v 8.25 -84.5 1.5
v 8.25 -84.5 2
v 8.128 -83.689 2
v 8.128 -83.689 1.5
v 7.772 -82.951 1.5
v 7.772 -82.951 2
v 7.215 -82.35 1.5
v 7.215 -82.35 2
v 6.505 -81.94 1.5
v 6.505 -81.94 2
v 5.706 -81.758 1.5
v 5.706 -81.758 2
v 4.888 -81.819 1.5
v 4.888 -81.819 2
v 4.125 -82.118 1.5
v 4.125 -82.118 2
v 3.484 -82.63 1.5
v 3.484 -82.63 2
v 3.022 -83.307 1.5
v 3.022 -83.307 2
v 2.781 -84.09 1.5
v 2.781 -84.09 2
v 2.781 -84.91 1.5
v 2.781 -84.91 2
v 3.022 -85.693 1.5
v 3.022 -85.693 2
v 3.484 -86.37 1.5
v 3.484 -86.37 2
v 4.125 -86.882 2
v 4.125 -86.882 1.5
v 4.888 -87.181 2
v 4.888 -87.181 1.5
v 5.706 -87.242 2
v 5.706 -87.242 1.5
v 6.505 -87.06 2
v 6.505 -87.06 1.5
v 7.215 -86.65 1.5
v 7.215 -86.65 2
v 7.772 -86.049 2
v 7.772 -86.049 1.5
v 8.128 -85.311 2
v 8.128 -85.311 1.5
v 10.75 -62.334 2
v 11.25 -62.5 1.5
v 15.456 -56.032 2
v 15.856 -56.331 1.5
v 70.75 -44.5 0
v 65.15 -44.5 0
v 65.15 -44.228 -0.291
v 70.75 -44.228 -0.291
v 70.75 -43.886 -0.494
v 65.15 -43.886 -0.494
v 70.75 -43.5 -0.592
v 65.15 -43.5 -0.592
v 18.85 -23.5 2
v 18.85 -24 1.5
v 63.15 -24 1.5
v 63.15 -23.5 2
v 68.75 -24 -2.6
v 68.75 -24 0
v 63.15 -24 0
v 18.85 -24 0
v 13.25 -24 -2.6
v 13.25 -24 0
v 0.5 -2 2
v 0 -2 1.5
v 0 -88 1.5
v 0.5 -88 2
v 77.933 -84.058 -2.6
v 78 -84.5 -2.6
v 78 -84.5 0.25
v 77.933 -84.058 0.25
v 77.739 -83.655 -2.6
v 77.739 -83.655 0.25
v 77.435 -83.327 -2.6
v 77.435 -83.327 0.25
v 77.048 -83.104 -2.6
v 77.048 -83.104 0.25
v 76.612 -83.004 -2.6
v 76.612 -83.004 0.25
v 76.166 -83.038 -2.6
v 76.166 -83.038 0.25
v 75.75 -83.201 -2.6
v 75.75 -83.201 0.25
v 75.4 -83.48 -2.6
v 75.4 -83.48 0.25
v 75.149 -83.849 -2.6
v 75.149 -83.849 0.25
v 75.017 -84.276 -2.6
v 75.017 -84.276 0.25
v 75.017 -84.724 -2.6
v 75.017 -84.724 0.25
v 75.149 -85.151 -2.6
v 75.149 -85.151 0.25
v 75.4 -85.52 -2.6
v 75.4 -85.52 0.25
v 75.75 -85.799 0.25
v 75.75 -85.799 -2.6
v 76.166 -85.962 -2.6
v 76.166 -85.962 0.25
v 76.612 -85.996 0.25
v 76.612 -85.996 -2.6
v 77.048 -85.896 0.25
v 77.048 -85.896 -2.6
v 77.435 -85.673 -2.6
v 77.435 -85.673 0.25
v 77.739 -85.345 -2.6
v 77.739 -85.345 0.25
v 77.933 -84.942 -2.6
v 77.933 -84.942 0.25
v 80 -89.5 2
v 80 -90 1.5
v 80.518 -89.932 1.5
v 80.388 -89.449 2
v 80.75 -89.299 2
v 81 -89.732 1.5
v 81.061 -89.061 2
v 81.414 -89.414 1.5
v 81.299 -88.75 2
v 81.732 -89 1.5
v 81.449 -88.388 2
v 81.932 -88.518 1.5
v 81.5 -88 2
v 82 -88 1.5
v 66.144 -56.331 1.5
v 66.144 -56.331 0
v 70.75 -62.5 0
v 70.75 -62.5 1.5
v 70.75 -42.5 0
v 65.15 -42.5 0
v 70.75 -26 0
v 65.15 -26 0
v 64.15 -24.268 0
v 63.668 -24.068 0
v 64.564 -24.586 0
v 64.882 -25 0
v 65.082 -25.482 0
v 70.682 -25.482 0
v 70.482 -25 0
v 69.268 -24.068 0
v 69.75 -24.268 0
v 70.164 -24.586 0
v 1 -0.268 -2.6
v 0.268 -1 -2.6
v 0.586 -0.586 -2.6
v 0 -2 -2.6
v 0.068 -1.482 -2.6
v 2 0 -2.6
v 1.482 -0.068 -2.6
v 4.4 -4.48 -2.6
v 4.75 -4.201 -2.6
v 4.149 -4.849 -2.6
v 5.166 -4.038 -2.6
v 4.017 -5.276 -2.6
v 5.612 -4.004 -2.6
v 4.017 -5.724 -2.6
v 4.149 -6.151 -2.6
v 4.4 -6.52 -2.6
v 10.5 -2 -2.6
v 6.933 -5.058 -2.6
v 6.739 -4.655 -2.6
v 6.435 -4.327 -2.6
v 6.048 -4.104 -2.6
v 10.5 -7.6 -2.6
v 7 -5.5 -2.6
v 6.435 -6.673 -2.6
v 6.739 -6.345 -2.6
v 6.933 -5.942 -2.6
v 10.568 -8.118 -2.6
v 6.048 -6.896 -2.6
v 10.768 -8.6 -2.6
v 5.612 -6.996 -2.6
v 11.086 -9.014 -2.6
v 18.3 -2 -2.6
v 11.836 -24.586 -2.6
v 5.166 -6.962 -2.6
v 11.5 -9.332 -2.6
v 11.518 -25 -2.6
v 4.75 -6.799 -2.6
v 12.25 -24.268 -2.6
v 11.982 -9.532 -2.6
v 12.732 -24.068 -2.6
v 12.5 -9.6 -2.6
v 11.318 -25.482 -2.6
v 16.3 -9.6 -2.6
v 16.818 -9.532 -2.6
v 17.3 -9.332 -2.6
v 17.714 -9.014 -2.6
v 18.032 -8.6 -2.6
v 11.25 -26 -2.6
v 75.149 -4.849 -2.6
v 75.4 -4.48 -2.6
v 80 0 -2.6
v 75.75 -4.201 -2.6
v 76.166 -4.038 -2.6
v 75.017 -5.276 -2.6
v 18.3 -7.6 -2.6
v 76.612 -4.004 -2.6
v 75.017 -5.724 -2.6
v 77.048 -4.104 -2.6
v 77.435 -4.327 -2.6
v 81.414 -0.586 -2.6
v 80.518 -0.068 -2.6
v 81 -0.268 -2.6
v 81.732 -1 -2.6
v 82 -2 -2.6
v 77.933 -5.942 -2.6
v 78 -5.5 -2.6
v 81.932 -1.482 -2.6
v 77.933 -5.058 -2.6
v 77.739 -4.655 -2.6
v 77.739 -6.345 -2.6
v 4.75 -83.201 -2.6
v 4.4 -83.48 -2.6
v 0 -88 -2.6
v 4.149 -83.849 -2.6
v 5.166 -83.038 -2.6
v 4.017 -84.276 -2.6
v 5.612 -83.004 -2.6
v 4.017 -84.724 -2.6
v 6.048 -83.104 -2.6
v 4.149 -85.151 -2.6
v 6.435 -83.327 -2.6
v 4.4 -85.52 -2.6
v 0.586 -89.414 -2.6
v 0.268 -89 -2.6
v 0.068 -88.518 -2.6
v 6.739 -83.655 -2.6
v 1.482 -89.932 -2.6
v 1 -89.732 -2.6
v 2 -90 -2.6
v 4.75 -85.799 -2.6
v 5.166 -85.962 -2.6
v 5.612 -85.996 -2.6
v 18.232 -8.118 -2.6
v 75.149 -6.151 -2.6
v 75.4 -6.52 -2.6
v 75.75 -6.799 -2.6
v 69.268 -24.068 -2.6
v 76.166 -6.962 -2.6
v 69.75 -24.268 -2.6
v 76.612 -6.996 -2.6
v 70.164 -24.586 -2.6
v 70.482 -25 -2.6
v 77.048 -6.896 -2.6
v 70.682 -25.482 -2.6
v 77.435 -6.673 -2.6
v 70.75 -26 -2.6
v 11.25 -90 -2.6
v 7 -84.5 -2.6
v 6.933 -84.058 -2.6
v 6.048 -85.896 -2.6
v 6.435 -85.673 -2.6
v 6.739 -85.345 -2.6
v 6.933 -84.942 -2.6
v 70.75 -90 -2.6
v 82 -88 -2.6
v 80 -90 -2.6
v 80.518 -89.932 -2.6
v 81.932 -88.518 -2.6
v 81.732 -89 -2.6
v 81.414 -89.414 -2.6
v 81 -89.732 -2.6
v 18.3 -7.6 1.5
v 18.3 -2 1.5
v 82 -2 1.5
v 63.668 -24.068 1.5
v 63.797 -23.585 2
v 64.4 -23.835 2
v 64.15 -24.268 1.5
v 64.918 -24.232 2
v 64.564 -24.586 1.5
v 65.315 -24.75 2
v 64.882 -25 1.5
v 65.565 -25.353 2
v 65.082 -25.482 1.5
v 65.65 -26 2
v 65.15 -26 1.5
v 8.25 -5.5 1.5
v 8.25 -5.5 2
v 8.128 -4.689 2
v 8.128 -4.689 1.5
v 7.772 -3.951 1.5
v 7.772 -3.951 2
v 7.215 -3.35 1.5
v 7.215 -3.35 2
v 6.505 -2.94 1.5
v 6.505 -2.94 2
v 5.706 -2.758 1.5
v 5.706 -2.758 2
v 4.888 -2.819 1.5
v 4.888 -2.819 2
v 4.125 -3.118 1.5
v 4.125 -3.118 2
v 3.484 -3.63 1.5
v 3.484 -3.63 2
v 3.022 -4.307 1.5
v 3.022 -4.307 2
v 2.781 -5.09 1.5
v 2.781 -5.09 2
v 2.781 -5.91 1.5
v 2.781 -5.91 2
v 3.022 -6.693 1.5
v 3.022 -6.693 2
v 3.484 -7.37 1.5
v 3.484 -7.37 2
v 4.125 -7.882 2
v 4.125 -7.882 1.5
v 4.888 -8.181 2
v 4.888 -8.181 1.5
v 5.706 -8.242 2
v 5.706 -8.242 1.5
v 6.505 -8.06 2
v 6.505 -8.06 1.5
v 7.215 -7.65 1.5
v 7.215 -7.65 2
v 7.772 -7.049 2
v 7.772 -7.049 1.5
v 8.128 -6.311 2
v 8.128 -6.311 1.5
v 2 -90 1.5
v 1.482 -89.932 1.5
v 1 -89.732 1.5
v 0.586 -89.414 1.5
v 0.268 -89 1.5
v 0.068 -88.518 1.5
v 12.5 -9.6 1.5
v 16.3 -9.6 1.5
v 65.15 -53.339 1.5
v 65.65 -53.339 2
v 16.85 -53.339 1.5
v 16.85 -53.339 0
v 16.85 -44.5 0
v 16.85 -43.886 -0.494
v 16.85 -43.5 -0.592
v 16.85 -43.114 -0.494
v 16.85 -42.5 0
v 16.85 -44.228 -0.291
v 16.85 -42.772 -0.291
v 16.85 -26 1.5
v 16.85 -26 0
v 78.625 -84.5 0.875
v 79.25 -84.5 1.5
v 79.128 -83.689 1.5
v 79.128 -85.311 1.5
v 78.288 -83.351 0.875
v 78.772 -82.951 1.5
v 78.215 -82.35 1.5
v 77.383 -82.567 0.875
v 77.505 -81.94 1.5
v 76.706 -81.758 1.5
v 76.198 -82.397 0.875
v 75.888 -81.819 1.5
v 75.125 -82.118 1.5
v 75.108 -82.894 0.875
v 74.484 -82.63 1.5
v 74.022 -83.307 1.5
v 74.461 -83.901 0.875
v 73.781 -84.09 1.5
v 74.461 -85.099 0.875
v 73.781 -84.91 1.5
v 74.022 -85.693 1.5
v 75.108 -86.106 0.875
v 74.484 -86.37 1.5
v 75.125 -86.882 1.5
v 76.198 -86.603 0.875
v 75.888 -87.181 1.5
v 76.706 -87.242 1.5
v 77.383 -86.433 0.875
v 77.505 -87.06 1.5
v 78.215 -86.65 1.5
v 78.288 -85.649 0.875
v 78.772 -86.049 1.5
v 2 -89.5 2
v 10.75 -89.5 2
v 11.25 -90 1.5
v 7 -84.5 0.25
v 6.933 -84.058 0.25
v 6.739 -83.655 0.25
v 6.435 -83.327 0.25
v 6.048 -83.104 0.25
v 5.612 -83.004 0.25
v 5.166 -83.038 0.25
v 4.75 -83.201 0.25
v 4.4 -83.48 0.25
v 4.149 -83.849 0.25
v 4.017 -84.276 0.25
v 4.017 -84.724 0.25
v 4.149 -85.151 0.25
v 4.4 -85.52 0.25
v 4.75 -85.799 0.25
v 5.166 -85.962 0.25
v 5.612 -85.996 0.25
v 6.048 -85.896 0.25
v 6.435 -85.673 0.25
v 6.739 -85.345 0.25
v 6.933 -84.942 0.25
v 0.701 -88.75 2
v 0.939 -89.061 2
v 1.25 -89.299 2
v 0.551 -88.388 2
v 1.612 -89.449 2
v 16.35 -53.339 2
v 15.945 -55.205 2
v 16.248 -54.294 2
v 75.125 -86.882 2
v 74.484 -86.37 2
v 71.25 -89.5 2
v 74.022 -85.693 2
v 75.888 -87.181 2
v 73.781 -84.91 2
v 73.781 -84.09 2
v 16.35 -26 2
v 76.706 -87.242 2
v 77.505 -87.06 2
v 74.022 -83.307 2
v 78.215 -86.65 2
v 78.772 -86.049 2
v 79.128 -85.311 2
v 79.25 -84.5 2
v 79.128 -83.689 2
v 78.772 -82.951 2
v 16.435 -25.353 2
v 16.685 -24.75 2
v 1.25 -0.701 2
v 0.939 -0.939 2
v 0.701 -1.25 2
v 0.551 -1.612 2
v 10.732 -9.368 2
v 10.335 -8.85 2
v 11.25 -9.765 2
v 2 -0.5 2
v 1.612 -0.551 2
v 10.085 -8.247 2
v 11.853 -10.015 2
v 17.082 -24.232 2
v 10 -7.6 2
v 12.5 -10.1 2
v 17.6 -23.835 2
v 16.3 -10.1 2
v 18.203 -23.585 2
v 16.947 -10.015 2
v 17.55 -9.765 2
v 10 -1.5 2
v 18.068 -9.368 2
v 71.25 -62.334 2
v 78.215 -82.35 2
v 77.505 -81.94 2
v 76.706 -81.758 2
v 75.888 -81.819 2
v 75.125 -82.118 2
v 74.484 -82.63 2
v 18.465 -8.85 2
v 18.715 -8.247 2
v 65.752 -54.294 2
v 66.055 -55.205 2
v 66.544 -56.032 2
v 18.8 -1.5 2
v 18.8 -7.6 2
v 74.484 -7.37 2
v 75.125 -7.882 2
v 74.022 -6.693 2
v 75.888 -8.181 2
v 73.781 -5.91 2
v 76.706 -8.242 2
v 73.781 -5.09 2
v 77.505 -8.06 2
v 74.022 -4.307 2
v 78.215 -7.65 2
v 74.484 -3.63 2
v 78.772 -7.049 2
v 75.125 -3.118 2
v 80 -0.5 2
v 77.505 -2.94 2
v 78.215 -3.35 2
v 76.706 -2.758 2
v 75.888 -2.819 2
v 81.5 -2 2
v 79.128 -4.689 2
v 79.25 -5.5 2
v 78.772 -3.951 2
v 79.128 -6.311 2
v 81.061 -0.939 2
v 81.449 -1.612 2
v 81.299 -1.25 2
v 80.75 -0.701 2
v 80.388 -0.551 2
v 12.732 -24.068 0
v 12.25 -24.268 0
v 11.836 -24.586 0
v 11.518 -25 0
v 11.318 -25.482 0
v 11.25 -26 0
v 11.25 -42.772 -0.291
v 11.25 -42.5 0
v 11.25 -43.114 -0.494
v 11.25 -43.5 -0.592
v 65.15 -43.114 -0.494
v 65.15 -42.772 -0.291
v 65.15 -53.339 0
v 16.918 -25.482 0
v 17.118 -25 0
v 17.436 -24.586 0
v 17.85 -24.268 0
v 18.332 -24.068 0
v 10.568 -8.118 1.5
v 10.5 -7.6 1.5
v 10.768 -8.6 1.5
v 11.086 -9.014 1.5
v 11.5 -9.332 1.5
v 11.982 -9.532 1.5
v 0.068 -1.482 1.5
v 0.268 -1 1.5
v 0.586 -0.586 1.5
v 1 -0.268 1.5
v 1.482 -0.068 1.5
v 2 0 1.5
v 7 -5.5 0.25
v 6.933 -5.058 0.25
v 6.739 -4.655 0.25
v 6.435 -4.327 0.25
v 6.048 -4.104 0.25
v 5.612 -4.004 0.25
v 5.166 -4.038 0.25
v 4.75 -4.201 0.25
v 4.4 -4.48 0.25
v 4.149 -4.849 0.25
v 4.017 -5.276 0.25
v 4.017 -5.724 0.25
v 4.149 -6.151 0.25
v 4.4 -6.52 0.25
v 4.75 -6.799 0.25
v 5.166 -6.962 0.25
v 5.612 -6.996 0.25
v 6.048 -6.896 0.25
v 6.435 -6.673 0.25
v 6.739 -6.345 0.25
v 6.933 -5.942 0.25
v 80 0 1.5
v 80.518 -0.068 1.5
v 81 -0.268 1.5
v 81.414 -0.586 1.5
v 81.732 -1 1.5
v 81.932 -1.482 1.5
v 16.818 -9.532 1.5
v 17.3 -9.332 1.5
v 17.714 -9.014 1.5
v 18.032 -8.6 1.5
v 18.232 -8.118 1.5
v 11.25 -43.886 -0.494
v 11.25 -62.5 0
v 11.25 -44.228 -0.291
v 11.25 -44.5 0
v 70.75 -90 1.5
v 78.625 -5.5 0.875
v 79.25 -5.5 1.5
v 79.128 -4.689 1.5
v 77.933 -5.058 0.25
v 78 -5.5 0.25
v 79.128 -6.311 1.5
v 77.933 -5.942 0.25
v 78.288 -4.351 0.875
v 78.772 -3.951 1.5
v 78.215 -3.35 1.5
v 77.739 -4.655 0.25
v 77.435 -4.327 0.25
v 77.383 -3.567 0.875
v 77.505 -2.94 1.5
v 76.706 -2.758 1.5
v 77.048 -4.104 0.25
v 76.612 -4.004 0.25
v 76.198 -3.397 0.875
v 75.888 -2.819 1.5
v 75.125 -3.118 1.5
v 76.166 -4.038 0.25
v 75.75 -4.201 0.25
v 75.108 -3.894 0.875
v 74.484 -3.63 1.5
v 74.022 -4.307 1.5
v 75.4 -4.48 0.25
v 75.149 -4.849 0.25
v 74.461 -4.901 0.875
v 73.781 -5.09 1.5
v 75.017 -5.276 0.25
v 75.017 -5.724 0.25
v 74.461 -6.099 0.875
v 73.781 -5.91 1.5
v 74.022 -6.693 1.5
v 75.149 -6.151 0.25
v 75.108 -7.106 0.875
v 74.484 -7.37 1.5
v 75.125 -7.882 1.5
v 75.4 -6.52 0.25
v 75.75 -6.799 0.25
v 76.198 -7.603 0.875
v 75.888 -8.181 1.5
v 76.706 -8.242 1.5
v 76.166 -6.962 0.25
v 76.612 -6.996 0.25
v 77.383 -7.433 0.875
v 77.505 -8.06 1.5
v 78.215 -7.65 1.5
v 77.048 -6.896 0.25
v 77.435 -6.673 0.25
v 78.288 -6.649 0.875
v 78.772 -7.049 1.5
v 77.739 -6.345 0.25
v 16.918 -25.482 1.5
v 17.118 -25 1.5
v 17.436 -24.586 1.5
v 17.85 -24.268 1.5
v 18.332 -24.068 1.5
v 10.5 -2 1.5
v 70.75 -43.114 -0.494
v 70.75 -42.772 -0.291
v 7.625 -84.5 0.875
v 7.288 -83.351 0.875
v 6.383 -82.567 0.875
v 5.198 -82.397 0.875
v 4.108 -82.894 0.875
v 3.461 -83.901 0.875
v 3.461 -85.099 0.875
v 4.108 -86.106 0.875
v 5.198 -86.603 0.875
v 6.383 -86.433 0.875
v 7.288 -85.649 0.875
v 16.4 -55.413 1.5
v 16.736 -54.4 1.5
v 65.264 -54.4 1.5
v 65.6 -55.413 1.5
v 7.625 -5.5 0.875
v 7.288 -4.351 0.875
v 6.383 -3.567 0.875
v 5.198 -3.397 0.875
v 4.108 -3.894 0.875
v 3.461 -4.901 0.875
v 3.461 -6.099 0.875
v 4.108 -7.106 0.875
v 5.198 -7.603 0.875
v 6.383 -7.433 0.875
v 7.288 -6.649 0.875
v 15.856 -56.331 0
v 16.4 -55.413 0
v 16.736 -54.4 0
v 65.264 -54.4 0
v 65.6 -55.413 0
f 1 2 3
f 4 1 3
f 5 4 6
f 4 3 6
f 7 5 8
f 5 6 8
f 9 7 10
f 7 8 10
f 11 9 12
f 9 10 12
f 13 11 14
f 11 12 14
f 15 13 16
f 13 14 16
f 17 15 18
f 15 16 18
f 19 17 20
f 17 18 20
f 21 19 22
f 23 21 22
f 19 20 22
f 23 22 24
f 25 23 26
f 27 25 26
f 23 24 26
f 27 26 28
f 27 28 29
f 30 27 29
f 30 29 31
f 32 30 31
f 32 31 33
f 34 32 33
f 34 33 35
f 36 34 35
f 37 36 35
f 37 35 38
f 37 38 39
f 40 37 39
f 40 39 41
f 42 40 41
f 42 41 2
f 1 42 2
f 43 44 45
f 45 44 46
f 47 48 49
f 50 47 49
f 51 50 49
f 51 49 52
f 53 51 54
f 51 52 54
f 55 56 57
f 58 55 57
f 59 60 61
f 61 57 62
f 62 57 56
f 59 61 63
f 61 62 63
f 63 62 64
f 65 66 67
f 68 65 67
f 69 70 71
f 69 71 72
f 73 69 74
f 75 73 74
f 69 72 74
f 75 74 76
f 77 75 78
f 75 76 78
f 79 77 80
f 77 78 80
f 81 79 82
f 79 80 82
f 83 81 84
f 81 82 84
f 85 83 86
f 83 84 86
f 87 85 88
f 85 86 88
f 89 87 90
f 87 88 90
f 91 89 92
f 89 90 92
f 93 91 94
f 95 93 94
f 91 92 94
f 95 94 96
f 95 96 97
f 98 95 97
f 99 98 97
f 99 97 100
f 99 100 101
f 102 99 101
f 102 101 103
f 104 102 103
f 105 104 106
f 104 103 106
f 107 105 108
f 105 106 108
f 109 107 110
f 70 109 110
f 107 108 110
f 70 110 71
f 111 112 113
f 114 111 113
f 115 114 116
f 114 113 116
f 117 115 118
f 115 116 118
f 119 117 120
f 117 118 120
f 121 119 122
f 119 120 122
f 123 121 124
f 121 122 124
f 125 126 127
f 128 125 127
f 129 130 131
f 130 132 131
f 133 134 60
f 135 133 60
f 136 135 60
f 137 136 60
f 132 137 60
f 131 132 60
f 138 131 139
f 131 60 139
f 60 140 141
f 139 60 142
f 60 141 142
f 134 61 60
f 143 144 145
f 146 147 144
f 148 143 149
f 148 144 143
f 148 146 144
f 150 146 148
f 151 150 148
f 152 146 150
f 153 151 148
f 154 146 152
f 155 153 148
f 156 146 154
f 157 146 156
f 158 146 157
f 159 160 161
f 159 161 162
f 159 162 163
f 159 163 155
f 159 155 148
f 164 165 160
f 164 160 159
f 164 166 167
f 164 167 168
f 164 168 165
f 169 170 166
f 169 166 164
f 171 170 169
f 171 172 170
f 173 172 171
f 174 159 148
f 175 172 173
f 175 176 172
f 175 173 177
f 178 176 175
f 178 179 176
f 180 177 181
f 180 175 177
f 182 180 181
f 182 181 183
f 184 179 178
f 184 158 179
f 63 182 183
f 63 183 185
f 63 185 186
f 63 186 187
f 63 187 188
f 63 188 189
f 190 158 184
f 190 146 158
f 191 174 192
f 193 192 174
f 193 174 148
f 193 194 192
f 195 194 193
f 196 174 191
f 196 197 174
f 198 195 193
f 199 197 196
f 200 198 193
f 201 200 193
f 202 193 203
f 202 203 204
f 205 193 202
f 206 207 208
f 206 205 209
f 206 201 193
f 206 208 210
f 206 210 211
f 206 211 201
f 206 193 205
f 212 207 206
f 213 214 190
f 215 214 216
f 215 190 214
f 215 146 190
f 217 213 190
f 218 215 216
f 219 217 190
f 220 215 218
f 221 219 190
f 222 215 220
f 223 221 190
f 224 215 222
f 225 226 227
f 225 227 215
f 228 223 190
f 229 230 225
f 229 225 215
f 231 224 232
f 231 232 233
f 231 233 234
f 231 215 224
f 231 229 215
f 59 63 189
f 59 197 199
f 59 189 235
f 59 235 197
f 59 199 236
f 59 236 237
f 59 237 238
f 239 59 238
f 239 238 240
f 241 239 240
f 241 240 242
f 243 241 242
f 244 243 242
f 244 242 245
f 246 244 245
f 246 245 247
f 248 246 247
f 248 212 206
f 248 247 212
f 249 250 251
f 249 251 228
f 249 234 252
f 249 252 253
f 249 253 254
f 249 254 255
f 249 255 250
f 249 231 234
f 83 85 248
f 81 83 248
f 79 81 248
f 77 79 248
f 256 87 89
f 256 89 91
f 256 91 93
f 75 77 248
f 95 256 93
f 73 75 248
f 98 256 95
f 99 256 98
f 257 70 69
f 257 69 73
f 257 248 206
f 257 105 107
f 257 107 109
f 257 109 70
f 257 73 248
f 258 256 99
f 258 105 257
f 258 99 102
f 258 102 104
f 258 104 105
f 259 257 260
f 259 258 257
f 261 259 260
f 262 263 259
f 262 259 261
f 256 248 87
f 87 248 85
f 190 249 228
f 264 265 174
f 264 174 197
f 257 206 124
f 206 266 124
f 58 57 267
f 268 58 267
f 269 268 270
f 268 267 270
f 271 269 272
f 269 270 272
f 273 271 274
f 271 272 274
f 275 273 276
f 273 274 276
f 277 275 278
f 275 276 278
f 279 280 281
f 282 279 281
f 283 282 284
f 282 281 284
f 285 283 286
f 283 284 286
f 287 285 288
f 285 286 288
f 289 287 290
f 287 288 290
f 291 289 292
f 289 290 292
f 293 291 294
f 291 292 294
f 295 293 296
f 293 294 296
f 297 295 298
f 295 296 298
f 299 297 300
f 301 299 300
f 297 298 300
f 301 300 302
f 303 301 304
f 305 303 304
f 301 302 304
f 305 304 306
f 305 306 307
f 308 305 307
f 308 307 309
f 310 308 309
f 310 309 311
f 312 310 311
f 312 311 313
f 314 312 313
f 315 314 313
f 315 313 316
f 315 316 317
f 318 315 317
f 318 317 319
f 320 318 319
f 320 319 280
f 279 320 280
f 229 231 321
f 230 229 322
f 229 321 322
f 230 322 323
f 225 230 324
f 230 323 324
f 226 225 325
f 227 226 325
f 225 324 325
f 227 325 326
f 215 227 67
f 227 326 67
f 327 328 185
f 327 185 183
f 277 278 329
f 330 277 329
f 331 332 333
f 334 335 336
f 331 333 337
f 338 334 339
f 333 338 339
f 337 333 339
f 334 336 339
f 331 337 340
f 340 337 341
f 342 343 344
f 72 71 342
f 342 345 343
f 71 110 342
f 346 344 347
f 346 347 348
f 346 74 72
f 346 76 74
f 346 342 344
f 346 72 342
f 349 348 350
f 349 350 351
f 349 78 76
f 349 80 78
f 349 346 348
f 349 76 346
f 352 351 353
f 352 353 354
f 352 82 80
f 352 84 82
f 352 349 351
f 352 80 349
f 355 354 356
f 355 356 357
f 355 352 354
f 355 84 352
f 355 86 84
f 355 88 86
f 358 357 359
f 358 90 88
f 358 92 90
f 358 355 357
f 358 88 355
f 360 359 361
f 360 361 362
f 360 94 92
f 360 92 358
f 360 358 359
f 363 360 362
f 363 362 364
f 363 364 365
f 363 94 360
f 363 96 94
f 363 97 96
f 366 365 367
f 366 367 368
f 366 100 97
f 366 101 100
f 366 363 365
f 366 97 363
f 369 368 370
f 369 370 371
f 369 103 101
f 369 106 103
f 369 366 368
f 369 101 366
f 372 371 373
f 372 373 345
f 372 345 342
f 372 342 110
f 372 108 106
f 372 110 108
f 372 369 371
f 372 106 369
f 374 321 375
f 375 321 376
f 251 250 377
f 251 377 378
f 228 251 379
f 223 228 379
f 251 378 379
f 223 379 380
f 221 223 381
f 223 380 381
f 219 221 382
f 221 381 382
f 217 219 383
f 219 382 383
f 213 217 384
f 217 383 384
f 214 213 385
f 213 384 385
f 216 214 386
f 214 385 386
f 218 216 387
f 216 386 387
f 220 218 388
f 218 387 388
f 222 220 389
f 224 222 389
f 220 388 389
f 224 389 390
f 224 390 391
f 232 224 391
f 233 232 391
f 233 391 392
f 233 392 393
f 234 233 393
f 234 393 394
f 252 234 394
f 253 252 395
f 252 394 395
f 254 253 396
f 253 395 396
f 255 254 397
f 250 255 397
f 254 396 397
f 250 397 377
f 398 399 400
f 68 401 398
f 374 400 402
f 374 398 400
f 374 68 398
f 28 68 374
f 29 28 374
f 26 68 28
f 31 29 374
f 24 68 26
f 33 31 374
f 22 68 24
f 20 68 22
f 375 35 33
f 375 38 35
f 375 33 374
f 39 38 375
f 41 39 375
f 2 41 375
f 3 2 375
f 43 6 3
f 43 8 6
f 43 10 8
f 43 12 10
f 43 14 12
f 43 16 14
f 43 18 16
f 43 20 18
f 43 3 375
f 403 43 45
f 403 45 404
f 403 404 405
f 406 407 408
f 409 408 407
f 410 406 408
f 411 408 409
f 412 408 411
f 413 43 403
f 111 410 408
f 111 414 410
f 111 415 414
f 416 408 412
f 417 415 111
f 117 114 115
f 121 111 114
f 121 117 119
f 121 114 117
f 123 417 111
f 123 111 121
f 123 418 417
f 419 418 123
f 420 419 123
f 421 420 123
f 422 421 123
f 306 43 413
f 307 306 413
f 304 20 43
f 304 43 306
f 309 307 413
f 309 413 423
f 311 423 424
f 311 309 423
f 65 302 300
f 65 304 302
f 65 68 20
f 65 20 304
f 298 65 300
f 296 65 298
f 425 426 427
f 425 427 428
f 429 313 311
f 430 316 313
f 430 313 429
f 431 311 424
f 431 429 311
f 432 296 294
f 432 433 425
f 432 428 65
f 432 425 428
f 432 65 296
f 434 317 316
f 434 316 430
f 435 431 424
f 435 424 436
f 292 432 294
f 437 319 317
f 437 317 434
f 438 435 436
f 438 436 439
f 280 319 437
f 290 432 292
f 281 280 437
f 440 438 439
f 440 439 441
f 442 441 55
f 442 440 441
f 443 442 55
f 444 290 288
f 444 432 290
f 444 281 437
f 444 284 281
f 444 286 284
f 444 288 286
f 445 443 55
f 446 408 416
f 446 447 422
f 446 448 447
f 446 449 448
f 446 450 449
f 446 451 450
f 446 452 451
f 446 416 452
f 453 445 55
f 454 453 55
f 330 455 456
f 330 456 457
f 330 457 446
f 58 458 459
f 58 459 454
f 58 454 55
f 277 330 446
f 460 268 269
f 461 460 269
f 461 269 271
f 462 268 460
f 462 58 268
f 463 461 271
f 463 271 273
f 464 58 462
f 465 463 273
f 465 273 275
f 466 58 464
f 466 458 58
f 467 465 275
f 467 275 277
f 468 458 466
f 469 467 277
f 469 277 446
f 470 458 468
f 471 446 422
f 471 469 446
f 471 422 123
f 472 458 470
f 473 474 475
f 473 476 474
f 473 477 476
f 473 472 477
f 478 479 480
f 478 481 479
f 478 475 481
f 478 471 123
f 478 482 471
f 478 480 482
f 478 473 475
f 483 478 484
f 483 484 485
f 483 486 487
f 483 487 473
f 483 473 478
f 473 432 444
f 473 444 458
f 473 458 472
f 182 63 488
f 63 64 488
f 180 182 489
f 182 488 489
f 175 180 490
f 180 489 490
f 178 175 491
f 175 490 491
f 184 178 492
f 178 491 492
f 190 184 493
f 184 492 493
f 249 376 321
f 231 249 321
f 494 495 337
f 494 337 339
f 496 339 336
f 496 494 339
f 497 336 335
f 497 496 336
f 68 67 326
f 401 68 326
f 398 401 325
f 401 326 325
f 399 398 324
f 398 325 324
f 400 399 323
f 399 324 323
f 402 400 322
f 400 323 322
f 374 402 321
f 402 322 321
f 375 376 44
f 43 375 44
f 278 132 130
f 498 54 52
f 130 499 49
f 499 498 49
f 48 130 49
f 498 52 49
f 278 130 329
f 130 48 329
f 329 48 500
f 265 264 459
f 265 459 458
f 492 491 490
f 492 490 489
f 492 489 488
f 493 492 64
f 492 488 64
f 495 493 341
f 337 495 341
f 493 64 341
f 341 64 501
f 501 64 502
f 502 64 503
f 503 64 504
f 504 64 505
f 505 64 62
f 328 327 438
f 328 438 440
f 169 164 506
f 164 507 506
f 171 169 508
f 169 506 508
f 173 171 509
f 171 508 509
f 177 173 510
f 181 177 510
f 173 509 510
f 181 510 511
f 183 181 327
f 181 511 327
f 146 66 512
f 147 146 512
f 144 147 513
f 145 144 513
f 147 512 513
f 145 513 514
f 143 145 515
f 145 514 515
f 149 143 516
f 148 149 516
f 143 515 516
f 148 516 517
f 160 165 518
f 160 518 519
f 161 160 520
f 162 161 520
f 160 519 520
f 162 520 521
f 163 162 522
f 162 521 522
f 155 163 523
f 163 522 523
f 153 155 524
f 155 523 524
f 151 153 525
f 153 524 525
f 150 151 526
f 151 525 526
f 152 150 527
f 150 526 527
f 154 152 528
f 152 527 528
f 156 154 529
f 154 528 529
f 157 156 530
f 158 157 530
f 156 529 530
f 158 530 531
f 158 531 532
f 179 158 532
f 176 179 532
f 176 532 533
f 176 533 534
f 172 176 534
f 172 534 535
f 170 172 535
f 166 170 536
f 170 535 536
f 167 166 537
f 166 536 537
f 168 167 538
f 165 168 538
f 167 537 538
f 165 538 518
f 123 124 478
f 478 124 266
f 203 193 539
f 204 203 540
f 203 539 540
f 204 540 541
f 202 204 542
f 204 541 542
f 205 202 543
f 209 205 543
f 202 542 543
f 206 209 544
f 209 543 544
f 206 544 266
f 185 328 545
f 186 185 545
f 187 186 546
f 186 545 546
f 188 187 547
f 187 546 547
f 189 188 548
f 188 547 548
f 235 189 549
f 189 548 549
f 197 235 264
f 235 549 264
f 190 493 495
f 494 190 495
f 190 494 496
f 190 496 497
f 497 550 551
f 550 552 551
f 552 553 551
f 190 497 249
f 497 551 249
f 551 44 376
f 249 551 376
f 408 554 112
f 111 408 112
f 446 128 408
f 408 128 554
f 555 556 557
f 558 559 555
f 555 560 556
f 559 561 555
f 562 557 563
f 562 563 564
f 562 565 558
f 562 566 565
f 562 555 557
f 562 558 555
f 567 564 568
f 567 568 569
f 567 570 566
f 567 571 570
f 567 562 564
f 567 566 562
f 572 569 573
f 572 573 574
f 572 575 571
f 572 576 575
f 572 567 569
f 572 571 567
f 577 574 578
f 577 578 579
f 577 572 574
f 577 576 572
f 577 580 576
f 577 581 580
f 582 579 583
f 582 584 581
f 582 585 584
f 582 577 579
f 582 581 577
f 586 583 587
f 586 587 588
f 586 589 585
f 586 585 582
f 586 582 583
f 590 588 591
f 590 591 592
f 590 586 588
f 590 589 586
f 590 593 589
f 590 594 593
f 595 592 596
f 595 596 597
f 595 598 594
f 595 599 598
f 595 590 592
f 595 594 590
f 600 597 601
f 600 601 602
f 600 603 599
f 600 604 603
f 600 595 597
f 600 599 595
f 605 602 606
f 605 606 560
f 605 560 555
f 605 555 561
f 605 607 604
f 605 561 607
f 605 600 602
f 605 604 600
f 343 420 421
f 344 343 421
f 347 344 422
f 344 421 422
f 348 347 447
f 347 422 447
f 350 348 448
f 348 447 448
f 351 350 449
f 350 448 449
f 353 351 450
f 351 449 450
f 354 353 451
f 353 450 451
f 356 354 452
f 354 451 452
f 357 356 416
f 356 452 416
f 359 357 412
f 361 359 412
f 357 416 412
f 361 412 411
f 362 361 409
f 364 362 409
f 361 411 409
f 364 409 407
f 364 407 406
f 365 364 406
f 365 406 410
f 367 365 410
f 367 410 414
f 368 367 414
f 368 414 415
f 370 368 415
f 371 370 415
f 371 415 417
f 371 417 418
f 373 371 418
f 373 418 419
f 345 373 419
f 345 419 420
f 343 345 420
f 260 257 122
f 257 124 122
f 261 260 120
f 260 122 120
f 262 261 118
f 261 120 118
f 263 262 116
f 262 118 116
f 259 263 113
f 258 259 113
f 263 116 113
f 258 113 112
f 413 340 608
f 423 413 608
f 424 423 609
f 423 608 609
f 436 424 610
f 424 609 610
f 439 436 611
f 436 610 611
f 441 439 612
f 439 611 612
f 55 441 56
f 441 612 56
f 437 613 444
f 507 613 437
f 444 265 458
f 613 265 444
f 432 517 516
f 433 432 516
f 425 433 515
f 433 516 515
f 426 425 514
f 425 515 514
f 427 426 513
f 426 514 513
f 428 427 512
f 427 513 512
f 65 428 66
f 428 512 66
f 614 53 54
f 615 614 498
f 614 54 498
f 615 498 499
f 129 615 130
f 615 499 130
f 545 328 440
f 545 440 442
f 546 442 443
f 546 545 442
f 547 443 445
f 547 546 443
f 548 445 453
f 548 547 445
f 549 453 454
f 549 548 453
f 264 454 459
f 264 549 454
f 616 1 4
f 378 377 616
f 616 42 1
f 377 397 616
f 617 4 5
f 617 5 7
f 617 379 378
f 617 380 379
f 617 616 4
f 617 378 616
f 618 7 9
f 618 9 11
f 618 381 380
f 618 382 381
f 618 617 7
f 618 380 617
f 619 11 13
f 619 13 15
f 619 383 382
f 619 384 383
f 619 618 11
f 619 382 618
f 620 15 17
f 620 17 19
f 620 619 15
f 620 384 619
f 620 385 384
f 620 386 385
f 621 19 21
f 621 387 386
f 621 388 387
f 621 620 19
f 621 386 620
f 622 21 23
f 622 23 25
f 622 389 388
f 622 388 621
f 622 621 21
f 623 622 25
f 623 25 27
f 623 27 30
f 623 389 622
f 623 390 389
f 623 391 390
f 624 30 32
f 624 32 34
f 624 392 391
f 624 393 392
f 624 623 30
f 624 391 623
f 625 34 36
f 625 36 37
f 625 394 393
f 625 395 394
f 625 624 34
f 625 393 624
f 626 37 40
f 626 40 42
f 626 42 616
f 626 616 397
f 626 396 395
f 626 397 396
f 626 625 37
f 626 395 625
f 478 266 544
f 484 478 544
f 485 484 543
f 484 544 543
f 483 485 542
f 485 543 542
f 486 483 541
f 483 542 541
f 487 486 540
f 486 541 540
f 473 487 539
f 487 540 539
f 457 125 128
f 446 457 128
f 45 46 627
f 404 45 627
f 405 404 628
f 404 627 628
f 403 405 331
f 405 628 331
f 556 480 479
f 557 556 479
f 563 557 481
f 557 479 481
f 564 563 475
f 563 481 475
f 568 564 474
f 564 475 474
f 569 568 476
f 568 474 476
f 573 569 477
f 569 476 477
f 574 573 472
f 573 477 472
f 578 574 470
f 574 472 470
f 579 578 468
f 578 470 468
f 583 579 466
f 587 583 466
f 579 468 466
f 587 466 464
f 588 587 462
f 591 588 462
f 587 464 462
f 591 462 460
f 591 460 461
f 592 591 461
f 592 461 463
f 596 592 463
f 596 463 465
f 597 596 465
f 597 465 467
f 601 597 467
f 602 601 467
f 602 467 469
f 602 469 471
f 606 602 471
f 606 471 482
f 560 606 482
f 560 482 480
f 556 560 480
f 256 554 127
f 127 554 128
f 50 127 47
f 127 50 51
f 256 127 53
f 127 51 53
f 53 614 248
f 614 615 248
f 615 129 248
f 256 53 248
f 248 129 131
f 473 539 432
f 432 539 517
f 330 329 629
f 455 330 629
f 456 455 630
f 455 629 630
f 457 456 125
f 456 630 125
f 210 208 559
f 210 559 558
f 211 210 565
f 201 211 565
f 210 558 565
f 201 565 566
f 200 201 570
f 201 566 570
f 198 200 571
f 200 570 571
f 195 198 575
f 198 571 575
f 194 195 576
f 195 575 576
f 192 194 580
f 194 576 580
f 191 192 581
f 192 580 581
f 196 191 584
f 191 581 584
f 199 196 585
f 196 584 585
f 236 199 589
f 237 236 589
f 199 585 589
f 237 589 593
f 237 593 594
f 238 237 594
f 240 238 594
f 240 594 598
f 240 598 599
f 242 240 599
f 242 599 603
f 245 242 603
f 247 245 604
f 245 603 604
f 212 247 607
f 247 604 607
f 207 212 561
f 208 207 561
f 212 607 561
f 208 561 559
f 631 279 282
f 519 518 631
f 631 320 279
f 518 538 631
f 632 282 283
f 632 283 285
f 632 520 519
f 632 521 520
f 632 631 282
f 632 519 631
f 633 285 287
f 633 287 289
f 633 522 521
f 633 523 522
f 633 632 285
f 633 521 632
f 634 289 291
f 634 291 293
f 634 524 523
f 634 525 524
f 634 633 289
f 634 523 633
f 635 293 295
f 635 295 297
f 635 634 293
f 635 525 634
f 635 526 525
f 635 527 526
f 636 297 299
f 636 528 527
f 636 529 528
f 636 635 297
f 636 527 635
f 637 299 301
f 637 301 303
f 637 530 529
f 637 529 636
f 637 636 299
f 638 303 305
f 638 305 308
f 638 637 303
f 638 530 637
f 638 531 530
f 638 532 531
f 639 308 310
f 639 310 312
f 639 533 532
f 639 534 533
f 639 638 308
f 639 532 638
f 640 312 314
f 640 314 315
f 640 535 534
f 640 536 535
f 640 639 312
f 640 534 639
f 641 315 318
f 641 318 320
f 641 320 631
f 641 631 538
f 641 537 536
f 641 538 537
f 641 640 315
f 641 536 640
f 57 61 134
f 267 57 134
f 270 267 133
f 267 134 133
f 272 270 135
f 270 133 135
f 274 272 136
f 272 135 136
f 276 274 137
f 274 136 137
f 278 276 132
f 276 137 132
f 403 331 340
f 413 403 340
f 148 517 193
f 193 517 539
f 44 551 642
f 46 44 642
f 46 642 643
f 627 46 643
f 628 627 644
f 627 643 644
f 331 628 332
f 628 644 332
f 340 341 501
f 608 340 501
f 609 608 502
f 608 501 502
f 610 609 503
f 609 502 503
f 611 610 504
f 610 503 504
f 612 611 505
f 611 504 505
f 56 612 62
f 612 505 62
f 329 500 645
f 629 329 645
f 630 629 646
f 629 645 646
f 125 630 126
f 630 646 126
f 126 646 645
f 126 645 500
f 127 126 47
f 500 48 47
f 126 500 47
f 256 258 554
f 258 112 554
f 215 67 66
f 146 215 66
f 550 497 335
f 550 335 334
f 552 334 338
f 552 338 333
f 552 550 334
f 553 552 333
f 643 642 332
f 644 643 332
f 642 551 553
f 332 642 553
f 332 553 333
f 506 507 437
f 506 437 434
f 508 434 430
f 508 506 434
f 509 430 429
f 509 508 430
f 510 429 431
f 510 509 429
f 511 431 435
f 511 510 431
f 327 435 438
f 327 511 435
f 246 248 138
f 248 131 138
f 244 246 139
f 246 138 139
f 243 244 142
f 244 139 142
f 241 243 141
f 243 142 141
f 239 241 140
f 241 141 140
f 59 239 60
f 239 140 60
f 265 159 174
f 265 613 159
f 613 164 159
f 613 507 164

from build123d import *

# Parameters (mm, degrees)
F1_DEPTH      = 2
F3_DEPTH      = 2.2
F5_DEPTH      = 25
F6_R          = 1.5
F7_DEPTH      = 4.2
F8_R          = 2.75
F9_DEPTH      = 2
F10_S5_R      = 1.5
F10_T6_DEPTH  = 5
F10_S11_R     = 1.5
F10_T12_DEPTH = 5
F10_S17_R     = 1.5
F10_T18_DEPTH = 5
F10_S23_R     = 1.5
F10_T24_DEPTH = 5
F11_W         = 5.6
F11_H         = 2
F12_DEPTH     = 0.6
F13_T1_DEPTH  = 8.4722813233
F13_T3_DEPTH  = 8.4722813233
F14_SIZE      = 0.5
F15_DEPTH     = 0.4


# Not quite as in the source:
# - a fillet or chamfer that OpenCascade refuses, or shapes differently, is made with other operations: its cross-section is extruded or revolved along the edge and cut away or added


with BuildPart() as f1:
    # F0 (on Top) → F1 (new body)
    with BuildSketch(Plane.XY):
        with BuildLine():
            Line((80, 0), (2, 0))
            ThreePointArc((2, 0), (0.5857864376, -0.5857864376), (0, -2))
            Line((0, -2), (0, -88))
            ThreePointArc((0, -88), (0.5857864376, -89.4142135624), (2, -90))
            Line((2, -90), (11.25, -90))
            Line((11.25, -90), (11.25, -62.5))
            Line((11.25, -62.5), (15.8564011104, -56.3307127986))
            ThreePointArc((15.8564011104, -56.3307127986), (16.5951030311, -54.9153368199), (16.85, -53.3392666362))
            Line((16.85, -53.3392666362), (16.85, -26))
            ThreePointArc((16.85, -26), (17.4357864376, -24.5857864376), (18.85, -24))
            Line((18.85, -24), (63.15, -24))
            ThreePointArc((63.15, -24), (64.5642135624, -24.5857864376), (65.15, -26))
            Line((65.15, -26), (65.15, -53.3392666362))
            ThreePointArc((65.15, -53.3392666362), (65.4048969689, -54.9153368199), (66.1435988896, -56.3307127986))
            Line((66.1435988896, -56.3307127986), (70.75, -62.5))
            Line((70.75, -62.5), (70.75, -90))
            Line((70.75, -90), (80, -90))
            ThreePointArc((80, -90), (81.4142135624, -89.4142135624), (82, -88))
            Line((82, -88), (82, -2))
            ThreePointArc((82, -2), (81.4142135624, -0.5857864376), (80, 0))
        make_face()
    extrude(amount=F1_DEPTH)

    # F2 (on face) → F3 (join)
    with BuildSketch(Plane(origin=(0, 0, 0), x_dir=(1, 0, 0), z_dir=(0, 0, -1))):
        with BuildLine():
            ThreePointArc((80, 0), (81.4142135624, 0.5857864376), (82, 2))
            Line((82, 2), (82, 88))
            ThreePointArc((82, 88), (81.4142135624, 89.4142135624), (80, 90))
            Line((80, 90), (70.75, 90))
            Line((70.75, 90), (70.75, 62.5))
            Line((70.75, 62.5), (70.75, 26))
            ThreePointArc((70.75, 26), (70.1642135624, 24.5857864376), (68.75, 24))
            Line((68.75, 24), (65.15, 24))
            Line((65.15, 24), (16.85, 24))
            Line((16.85, 24), (13.25, 24))
            ThreePointArc((13.25, 24), (11.8357864376, 24.5857864376), (11.25, 26))
            Line((11.25, 26), (11.25, 62.5))
            Line((11.25, 62.5), (11.25, 90))
            Line((11.25, 90), (2, 90))
            ThreePointArc((2, 90), (0.5857864376, 89.4142135624), (0, 88))
            Line((0, 88), (0, 2))
            ThreePointArc((0, 2), (0.5857864376, 0.5857864376), (2, 0))
            Line((2, 0), (80, 0))
        make_face()
    extrude(amount=F3_DEPTH)

    # F4 (on face) → F5 (cut)
    with BuildSketch(Plane.XY.offset(2)):
        with BuildLine():
            Line((18.3, -2), (10.5, -2))
            Line((10.5, -2), (10.5, -7.6))
            ThreePointArc((10.5, -7.6), (11.0857864376, -9.0142135624), (12.5, -9.6))
            Line((12.5, -9.6), (16.3, -9.6))
            ThreePointArc((16.3, -9.6), (17.7142135624, -9.0142135624), (18.3, -7.6))
            Line((18.3, -7.6), (18.3, -2))
        make_face()
    extrude(amount=-F5_DEPTH, mode=Mode.SUBTRACT)

    # F6 (on face) → F7 (cut)
    with BuildSketch(Plane.XY.offset(2)):
        with Locations((5.5, -84.5)):
            Circle(F6_R)
        with Locations((76.5, -84.5)):
            Circle(F6_R)
        with Locations((5.5, -5.5)):
            Circle(F6_R)
        with Locations((76.5, -5.5)):
            Circle(F6_R)
    extrude(amount=-F7_DEPTH, mode=Mode.SUBTRACT)

    # F8 (on face) → F9 (cut)
    with BuildSketch(Plane.XY.offset(2)):
        with Locations((5.5, -5.5)):
            Circle(F8_R)
        with Locations((76.5, -5.5)):
            Circle(F8_R)
        with Locations((76.5, -84.5)):
            Circle(F8_R)
        with Locations((5.5, -84.5)):
            Circle(F8_R)
    extrude(amount=-F9_DEPTH, mode=Mode.SUBTRACT)

    # F10: chamfer of 1.5 on 4 edges, made by hand


with BuildPart() as f10_tool2:
    # F10_s3 → F10_t4 (revolve)
    with BuildSketch(Plane.XZ.offset(84.5)):
        Polygon((8.25, 1.5), (6.75, 0), (8.25, 0), align=None)
    revolve(axis=Axis((5.5, -84.5, 0), (0, 0, 1)))

    # F10_s5 → F10_t6 (cut, symmetric)
    with BuildSketch(Plane.XY.offset(0.7)):
        with Locations((5.5, -84.5)):
            Circle(F10_S5_R)
    extrude(amount=F10_T6_DEPTH, both=True, mode=Mode.SUBTRACT)


with BuildPart() as f1_1:
    add(f1.part)

    # F10_t1: union F10_tool2
    add(f10_tool2.part)


with BuildPart() as f10_tool8:
    # F10_s9 → F10_t10 (revolve)
    with BuildSketch(Plane.XZ.offset(84.5)):
        Polygon((79.25, 1.5), (77.75, 0), (79.25, 0), align=None)
    revolve(axis=Axis((76.5, -84.5, 0), (0, 0, 1)))

    # F10_s11 → F10_t12 (cut, symmetric)
    with BuildSketch(Plane.XY.offset(0.7)):
        with Locations((76.5, -84.5)):
            Circle(F10_S11_R)
    extrude(amount=F10_T12_DEPTH, both=True, mode=Mode.SUBTRACT)


with BuildPart() as f1_2:
    add(f1_1.part)

    # F10_t7: union F10_tool8
    add(f10_tool8.part)


with BuildPart() as f10_tool14:
    # F10_s15 → F10_t16 (revolve)
    with BuildSketch(Plane.XZ.offset(5.5)):
        Polygon((8.25, 1.5), (6.75, 0), (8.25, 0), align=None)
    revolve(axis=Axis((5.5, -5.5, 0), (0, 0, 1)))

    # F10_s17 → F10_t18 (cut, symmetric)
    with BuildSketch(Plane.XY.offset(0.7)):
        with Locations((5.5, -5.5)):
            Circle(F10_S17_R)
    extrude(amount=F10_T18_DEPTH, both=True, mode=Mode.SUBTRACT)


with BuildPart() as f1_3:
    add(f1_2.part)

    # F10_t13: union F10_tool14
    add(f10_tool14.part)


with BuildPart() as f10_tool20:
    # F10_s21 → F10_t22 (revolve)
    with BuildSketch(Plane.XZ.offset(5.5)):
        Polygon((79.25, 1.5), (77.75, 0), (79.25, 0), align=None)
    revolve(axis=Axis((76.5, -5.5, 0), (0, 0, 1)))

    # F10_s23 → F10_t24 (cut, symmetric)
    with BuildSketch(Plane.XY.offset(0.7)):
        with Locations((76.5, -5.5)):
            Circle(F10_S23_R)
    extrude(amount=F10_T24_DEPTH, both=True, mode=Mode.SUBTRACT)


with BuildPart() as f1_4:
    add(f1_3.part)

    # F10_t19: union F10_tool20
    add(f10_tool20.part)

    # F11 (on face) → F12 (join)
    with BuildSketch(Plane(origin=(0, 0, 0), x_dir=(1, 0, 0), z_dir=(0, 0, -1))):
        with Locations((14.05, 43.5)):
            Rectangle(F11_W, F11_H)
        with Locations((67.95, 43.5)):
            Rectangle(F11_W, F11_H)
    extrude(amount=F12_DEPTH)

    # F13: fillet of radius 1.4 on 4 edges, made by hand

    # F13_s2 → F13_t1 (cut)
    with BuildSketch(Plane.YZ.offset(11.25)):
        with BuildLine():
            ThreePointArc((-42.5, 0), (-43.0008384595, -0.4409673646), (-43.6489125293, -0.6))
            Line((-43.6489125293, -0.6), (-42.5, -0.6))
            Line((-42.5, -0.6), (-42.5, 0))
        make_face()
        with BuildLine():
            ThreePointArc((-43.3510874707, -0.6), (-43.9991615405, -0.4409673646), (-44.5, 0))
            Line((-44.5, 0), (-44.5, -0.6))
            Line((-44.5, -0.6), (-43.3510874707, -0.6))
        make_face()
    extrude(amount=F13_T1_DEPTH, mode=Mode.SUBTRACT)

    # F13_s4 → F13_t3 (cut)
    with BuildSketch(Plane.YZ.offset(62.2777186767)):
        with BuildLine():
            ThreePointArc((-43.6489125293, -0.6), (-43.0008384595, -0.4409673646), (-42.5, 0))
            Line((-42.5, 0), (-42.5, -0.6))
            Line((-42.5, -0.6), (-43.6489125293, -0.6))
        make_face()
        with BuildLine():
            ThreePointArc((-44.5, 0), (-43.9991615405, -0.4409673646), (-43.3510874707, -0.6))
            Line((-43.3510874707, -0.6), (-44.5, -0.6))
            Line((-44.5, -0.6), (-44.5, 0))
        make_face()
    extrude(amount=F13_T3_DEPTH, mode=Mode.SUBTRACT)

    # F14
    f14_edges = [f1_4.edges().sort_by_distance(p)[0] for p in [
        (0.585786, -0.585786, 2),
        (41, 0, 2),
        (0, -45, 2),
        (10.5, -4.8, 2),
        (14.4, -2, 2),
        (18.3, -4.8, 2),
        (17.714214, -9.014214, 2),
        (14.4, -9.6, 2),
        (11.085786, -9.014214, 2),
        (81.414214, -0.585786, 2),
        (82, -45, 2),
        (11.25, -76.25, 2),
        (6.625, -90, 2),
        (0.585786, -89.414214, 2),
        (81.414214, -89.414214, 2),
        (75.375, -90, 2),
        (70.75, -76.25, 2),
        (68.446799, -59.415356, 2),
        (65.404897, -54.915337, 2),
        (65.15, -39.669633, 2),
        (64.564214, -24.585786, 2),
        (41, -24, 2),
        (17.435786, -24.585786, 2),
        (16.85, -39.669633, 2),
        (16.595103, -54.915337, 2),
        (13.553201, -59.415356, 2),
    ]]
    chamfer(f14_edges, length=F14_SIZE)

    # F15 (add): a face of the model
    f15_faces = [f1_4.faces().sort_by_distance(p)[0] for p in [
        (80.5532838324, -1.4467161676, -2.2),
    ]]
    extrude(f15_faces, amount=F15_DEPTH)


solid = f1_4.part
